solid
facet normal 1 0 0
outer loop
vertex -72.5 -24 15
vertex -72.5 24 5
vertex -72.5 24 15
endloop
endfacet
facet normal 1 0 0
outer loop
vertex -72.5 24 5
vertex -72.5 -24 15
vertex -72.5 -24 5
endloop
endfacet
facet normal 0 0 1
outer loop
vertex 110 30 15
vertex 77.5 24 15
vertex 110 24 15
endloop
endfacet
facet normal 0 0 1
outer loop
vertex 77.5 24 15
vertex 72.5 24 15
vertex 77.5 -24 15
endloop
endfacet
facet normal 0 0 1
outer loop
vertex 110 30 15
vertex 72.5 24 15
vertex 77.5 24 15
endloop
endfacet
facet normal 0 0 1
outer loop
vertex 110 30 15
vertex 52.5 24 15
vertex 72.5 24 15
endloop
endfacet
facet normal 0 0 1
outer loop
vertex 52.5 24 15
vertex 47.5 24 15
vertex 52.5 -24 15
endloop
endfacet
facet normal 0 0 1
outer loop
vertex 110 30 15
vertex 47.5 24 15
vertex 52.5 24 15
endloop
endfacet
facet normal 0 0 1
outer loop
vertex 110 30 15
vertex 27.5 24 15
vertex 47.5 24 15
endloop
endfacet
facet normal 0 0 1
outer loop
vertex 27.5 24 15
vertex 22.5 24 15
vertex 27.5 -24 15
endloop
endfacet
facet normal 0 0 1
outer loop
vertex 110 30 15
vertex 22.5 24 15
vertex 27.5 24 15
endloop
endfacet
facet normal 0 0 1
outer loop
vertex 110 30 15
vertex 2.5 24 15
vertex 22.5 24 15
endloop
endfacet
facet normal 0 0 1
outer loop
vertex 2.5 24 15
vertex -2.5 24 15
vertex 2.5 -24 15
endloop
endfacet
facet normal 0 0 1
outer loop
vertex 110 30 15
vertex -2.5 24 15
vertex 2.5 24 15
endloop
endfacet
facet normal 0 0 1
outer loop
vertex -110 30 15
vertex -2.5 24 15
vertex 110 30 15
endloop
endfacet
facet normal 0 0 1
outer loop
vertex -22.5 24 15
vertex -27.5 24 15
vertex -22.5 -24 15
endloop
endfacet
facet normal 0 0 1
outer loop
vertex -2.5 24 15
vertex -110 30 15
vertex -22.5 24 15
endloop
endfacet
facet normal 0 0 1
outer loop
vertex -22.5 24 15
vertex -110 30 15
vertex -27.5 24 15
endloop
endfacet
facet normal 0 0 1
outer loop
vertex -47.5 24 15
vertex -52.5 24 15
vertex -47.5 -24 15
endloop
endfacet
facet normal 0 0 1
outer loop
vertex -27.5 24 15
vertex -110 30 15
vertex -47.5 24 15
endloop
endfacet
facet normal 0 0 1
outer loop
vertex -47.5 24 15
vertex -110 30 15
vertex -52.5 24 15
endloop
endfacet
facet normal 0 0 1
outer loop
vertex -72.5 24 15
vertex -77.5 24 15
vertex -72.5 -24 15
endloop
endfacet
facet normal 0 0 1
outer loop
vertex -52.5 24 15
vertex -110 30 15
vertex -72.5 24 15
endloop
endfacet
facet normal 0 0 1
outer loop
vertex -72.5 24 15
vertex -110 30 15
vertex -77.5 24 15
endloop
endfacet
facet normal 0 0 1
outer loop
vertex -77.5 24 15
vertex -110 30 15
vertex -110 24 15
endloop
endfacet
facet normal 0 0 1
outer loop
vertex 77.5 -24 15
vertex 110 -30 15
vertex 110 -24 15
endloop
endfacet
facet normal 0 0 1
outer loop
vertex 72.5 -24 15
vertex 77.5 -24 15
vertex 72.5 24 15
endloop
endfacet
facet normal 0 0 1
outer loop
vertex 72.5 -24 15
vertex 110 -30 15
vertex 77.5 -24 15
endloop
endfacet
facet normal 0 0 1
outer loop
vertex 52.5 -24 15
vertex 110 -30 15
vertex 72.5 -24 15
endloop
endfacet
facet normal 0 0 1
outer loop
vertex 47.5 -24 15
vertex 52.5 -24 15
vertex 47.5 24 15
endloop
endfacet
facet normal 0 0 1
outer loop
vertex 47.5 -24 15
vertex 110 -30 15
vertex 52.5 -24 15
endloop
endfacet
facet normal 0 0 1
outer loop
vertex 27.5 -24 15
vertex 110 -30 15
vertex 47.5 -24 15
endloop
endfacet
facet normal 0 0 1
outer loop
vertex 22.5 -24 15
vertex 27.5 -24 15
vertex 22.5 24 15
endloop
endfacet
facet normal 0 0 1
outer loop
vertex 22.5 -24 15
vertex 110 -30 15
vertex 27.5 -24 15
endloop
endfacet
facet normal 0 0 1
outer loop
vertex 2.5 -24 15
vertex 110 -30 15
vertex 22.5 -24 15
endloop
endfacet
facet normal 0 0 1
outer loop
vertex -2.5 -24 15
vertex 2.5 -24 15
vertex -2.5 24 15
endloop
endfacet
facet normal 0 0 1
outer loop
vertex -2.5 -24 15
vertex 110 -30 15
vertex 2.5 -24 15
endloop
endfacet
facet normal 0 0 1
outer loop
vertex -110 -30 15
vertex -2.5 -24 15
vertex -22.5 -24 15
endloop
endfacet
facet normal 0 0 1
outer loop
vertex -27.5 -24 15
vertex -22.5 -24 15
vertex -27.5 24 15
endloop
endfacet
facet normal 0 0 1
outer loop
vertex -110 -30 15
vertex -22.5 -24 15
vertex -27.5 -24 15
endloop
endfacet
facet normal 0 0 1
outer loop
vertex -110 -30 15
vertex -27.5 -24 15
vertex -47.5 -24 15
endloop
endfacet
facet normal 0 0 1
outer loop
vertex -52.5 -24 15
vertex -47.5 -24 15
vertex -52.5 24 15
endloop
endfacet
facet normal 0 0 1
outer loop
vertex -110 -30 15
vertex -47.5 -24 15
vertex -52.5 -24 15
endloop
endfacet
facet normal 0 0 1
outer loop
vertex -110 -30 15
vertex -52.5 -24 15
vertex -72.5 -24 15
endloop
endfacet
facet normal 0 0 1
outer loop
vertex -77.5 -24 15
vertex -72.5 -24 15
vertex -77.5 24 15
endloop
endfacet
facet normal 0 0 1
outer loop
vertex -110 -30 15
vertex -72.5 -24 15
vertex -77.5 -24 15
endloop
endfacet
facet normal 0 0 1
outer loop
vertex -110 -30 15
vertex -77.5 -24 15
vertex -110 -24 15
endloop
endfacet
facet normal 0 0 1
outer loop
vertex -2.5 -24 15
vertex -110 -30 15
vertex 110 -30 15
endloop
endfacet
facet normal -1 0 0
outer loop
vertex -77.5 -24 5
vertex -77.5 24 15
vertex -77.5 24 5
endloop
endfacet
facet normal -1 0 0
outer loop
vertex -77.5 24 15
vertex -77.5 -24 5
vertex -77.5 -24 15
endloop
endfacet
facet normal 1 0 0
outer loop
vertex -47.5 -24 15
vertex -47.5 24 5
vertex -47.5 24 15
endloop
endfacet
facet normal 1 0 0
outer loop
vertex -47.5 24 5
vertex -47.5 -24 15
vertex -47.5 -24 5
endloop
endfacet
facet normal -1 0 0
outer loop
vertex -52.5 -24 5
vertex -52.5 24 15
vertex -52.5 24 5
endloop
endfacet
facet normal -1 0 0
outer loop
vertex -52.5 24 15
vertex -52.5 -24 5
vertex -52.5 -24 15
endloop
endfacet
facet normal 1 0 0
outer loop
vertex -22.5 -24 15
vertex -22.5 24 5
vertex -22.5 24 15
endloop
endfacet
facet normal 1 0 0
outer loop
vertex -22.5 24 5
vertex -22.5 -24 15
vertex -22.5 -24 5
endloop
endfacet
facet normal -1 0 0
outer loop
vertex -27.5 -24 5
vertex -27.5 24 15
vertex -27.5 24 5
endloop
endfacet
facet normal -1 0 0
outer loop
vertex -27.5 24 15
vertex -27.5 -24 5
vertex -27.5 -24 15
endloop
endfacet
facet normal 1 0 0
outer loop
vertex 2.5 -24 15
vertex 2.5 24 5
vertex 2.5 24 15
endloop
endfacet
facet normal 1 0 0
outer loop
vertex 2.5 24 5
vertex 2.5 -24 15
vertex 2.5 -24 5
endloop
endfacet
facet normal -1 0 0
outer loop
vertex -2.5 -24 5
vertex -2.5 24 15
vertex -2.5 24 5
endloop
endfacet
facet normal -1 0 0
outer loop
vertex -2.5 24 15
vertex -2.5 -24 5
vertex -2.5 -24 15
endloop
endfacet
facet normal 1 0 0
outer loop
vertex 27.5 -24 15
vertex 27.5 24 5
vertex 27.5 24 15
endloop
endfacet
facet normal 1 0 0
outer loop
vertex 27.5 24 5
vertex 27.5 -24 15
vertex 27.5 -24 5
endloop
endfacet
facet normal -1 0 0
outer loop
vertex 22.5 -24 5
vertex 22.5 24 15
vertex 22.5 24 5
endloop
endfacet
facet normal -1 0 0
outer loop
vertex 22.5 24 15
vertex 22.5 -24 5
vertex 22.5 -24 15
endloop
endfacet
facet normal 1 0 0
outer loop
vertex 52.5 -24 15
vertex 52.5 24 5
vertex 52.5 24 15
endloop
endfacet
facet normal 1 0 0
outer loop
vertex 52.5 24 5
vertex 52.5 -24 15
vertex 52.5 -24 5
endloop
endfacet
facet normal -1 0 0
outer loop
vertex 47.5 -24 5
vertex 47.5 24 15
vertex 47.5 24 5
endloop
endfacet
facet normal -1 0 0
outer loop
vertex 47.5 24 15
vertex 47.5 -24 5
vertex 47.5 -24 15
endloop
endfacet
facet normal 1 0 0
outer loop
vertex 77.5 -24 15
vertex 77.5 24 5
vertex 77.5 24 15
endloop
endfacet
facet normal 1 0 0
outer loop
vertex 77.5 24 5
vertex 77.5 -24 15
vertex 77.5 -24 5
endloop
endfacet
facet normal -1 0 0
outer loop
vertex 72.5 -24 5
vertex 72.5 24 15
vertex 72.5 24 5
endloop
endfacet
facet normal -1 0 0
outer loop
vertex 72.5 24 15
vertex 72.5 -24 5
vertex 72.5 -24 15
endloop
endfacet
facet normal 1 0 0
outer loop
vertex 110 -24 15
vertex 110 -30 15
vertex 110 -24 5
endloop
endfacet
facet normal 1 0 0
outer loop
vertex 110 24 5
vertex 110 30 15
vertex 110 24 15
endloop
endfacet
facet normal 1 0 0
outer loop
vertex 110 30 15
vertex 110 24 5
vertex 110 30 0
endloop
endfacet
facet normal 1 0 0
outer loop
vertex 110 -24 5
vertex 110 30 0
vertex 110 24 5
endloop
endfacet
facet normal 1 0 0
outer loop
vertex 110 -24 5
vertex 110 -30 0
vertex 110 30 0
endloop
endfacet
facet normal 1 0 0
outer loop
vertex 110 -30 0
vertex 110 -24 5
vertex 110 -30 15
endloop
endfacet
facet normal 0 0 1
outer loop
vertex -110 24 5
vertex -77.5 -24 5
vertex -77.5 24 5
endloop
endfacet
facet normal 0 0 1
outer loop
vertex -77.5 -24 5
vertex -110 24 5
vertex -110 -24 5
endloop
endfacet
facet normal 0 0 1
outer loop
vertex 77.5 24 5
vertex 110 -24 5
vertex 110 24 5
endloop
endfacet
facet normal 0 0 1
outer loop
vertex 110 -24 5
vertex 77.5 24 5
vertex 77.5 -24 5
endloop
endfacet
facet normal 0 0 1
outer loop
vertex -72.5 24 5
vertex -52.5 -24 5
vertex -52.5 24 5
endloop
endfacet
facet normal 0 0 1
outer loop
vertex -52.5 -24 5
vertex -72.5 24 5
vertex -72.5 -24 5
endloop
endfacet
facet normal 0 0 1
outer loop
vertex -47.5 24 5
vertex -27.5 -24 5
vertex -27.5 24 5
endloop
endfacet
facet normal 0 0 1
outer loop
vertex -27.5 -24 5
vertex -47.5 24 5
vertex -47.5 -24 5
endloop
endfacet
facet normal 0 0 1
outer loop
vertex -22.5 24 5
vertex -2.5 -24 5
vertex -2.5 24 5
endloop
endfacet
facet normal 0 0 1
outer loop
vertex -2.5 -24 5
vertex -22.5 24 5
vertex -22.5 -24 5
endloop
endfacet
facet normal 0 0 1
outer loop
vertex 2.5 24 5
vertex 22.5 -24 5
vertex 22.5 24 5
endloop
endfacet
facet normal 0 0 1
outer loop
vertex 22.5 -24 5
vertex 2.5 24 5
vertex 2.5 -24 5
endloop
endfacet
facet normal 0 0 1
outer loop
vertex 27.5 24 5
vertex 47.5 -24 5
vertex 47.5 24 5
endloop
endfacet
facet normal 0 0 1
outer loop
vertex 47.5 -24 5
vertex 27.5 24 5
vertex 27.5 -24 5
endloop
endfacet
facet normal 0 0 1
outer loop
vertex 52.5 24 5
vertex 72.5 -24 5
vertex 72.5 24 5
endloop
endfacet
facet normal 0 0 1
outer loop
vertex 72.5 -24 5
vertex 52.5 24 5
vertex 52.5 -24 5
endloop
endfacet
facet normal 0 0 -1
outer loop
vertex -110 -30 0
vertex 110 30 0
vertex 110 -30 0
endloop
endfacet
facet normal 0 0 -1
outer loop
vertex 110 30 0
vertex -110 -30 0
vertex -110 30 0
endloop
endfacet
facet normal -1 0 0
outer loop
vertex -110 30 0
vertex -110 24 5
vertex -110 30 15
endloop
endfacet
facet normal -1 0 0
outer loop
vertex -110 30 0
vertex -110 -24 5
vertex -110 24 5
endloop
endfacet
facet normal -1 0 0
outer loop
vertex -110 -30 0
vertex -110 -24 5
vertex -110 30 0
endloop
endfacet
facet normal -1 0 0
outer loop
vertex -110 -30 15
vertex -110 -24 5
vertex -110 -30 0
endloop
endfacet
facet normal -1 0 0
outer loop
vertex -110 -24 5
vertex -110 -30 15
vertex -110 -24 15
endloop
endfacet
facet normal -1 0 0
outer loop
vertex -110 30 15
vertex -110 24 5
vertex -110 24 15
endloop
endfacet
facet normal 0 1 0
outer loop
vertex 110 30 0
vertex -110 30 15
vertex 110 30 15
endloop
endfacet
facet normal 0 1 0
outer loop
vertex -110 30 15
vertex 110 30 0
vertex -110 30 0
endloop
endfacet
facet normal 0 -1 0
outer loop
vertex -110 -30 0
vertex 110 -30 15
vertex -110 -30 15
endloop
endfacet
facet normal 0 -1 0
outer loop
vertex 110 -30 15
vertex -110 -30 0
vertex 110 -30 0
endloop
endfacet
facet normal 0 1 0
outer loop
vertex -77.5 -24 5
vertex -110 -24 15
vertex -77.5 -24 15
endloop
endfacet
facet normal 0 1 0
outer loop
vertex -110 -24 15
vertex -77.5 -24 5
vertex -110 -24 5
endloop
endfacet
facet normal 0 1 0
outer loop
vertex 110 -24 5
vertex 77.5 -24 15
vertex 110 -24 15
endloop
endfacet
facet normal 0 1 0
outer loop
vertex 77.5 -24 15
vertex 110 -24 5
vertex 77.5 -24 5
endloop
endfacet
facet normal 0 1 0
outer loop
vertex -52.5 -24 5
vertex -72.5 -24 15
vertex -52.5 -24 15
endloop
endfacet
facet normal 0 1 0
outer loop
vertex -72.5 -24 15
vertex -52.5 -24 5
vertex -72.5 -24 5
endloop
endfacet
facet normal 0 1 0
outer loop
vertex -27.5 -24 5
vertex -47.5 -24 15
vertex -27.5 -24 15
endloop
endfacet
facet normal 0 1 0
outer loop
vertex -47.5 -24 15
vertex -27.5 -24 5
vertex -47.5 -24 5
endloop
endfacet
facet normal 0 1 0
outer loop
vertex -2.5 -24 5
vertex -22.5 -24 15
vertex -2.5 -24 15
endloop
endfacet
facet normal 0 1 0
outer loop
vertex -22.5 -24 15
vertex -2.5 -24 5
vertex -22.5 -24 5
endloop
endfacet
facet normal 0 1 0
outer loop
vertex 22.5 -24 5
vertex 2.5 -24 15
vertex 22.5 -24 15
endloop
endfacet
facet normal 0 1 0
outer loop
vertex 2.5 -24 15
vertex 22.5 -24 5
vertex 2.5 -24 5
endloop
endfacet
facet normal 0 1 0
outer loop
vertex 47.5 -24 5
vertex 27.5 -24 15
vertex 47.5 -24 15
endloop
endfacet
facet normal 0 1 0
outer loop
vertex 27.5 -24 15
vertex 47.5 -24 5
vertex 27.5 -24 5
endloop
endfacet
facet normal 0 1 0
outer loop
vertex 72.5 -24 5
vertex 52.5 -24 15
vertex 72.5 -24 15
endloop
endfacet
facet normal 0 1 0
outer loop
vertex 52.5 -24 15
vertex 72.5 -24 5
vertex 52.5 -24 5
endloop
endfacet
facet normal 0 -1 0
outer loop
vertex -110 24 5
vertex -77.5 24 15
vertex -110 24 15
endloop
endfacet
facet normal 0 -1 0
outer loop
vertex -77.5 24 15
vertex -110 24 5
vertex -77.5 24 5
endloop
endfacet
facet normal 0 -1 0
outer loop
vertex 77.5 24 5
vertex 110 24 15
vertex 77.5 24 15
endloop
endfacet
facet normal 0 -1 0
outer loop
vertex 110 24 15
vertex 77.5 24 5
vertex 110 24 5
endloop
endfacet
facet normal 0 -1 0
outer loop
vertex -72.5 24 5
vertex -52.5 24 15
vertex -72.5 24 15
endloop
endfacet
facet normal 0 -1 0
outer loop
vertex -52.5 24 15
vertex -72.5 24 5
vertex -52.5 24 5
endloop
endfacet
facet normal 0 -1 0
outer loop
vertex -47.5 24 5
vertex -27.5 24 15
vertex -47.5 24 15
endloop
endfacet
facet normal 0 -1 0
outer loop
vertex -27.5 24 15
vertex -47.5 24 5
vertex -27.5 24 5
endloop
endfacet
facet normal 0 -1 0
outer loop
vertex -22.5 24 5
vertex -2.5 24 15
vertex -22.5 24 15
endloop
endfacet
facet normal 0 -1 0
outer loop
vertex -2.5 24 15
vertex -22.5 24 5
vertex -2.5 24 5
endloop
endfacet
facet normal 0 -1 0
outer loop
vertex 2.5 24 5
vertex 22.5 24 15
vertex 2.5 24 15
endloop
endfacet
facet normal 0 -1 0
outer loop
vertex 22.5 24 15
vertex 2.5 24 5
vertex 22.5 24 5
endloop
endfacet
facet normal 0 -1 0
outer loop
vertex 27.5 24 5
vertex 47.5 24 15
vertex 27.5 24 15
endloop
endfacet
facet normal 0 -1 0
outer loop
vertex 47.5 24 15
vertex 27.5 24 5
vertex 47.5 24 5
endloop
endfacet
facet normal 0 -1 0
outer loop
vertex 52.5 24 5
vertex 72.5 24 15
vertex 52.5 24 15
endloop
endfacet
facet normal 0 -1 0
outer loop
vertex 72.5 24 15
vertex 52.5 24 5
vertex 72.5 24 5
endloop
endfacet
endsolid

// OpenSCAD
$fn = 32;

// ----------------------------------------------------------------------
// Rib frame 220 x 60 x 15
// 7 ribs at 25 mm pitch
// ----------------------------------------------------------------------

// --- parameters (mm) ---
frame = [220, 60, 5];  // base plate size (x, y, z)
seat_tol = 0.05;       // tolerance at the seating features
free_tol = 0.3;        // general tolerance on the free sizes
rail_w = 6;            // side rail width
ribs = 7;              // number of ribs
rib_t = 5;             // rib thickness
rib_h = 10;            // rib height above the base plate
pitch = 25;            // pitch between rib centres

// --- derived feature positions (mm) ---
span = (ribs - 1) * pitch;          // = 150   distance between the outer ribs
origin_x = -span / 2;               // = -75   X of the first rib
rib_len = frame[1] - 2 * rail_w + 2;  // = 50   rib length, 1 mm into each rail
feature_centers = [
  [origin_x + 0 * pitch, 0],
  [origin_x + 1 * pitch, 0],
  [origin_x + 2 * pitch, 0],
  [origin_x + 3 * pitch, 0],
  [origin_x + 4 * pitch, 0],
  [origin_x + 5 * pitch, 0],
  [origin_x + 6 * pitch, 0]
];   // rib centre line, drives the rib loop

// base plate, two side rails, then the ribs read straight off feature_centers
union() {
  translate([-frame[0] / 2, -frame[1] / 2, 0]) cube(frame);
  translate([-frame[0] / 2, -frame[1] / 2, 0]) cube([frame[0], rail_w, frame[2] + rib_h]);
  translate([-frame[0] / 2, frame[1] / 2 - rail_w, 0]) cube([frame[0], rail_w, frame[2] + rib_h]);
  for (centre = feature_centers)
    translate([centre[0] - rib_t / 2, centre[1] - rib_len / 2, frame[2] - 1])
      cube([rib_t, rib_len, rib_h + 1]);
}
